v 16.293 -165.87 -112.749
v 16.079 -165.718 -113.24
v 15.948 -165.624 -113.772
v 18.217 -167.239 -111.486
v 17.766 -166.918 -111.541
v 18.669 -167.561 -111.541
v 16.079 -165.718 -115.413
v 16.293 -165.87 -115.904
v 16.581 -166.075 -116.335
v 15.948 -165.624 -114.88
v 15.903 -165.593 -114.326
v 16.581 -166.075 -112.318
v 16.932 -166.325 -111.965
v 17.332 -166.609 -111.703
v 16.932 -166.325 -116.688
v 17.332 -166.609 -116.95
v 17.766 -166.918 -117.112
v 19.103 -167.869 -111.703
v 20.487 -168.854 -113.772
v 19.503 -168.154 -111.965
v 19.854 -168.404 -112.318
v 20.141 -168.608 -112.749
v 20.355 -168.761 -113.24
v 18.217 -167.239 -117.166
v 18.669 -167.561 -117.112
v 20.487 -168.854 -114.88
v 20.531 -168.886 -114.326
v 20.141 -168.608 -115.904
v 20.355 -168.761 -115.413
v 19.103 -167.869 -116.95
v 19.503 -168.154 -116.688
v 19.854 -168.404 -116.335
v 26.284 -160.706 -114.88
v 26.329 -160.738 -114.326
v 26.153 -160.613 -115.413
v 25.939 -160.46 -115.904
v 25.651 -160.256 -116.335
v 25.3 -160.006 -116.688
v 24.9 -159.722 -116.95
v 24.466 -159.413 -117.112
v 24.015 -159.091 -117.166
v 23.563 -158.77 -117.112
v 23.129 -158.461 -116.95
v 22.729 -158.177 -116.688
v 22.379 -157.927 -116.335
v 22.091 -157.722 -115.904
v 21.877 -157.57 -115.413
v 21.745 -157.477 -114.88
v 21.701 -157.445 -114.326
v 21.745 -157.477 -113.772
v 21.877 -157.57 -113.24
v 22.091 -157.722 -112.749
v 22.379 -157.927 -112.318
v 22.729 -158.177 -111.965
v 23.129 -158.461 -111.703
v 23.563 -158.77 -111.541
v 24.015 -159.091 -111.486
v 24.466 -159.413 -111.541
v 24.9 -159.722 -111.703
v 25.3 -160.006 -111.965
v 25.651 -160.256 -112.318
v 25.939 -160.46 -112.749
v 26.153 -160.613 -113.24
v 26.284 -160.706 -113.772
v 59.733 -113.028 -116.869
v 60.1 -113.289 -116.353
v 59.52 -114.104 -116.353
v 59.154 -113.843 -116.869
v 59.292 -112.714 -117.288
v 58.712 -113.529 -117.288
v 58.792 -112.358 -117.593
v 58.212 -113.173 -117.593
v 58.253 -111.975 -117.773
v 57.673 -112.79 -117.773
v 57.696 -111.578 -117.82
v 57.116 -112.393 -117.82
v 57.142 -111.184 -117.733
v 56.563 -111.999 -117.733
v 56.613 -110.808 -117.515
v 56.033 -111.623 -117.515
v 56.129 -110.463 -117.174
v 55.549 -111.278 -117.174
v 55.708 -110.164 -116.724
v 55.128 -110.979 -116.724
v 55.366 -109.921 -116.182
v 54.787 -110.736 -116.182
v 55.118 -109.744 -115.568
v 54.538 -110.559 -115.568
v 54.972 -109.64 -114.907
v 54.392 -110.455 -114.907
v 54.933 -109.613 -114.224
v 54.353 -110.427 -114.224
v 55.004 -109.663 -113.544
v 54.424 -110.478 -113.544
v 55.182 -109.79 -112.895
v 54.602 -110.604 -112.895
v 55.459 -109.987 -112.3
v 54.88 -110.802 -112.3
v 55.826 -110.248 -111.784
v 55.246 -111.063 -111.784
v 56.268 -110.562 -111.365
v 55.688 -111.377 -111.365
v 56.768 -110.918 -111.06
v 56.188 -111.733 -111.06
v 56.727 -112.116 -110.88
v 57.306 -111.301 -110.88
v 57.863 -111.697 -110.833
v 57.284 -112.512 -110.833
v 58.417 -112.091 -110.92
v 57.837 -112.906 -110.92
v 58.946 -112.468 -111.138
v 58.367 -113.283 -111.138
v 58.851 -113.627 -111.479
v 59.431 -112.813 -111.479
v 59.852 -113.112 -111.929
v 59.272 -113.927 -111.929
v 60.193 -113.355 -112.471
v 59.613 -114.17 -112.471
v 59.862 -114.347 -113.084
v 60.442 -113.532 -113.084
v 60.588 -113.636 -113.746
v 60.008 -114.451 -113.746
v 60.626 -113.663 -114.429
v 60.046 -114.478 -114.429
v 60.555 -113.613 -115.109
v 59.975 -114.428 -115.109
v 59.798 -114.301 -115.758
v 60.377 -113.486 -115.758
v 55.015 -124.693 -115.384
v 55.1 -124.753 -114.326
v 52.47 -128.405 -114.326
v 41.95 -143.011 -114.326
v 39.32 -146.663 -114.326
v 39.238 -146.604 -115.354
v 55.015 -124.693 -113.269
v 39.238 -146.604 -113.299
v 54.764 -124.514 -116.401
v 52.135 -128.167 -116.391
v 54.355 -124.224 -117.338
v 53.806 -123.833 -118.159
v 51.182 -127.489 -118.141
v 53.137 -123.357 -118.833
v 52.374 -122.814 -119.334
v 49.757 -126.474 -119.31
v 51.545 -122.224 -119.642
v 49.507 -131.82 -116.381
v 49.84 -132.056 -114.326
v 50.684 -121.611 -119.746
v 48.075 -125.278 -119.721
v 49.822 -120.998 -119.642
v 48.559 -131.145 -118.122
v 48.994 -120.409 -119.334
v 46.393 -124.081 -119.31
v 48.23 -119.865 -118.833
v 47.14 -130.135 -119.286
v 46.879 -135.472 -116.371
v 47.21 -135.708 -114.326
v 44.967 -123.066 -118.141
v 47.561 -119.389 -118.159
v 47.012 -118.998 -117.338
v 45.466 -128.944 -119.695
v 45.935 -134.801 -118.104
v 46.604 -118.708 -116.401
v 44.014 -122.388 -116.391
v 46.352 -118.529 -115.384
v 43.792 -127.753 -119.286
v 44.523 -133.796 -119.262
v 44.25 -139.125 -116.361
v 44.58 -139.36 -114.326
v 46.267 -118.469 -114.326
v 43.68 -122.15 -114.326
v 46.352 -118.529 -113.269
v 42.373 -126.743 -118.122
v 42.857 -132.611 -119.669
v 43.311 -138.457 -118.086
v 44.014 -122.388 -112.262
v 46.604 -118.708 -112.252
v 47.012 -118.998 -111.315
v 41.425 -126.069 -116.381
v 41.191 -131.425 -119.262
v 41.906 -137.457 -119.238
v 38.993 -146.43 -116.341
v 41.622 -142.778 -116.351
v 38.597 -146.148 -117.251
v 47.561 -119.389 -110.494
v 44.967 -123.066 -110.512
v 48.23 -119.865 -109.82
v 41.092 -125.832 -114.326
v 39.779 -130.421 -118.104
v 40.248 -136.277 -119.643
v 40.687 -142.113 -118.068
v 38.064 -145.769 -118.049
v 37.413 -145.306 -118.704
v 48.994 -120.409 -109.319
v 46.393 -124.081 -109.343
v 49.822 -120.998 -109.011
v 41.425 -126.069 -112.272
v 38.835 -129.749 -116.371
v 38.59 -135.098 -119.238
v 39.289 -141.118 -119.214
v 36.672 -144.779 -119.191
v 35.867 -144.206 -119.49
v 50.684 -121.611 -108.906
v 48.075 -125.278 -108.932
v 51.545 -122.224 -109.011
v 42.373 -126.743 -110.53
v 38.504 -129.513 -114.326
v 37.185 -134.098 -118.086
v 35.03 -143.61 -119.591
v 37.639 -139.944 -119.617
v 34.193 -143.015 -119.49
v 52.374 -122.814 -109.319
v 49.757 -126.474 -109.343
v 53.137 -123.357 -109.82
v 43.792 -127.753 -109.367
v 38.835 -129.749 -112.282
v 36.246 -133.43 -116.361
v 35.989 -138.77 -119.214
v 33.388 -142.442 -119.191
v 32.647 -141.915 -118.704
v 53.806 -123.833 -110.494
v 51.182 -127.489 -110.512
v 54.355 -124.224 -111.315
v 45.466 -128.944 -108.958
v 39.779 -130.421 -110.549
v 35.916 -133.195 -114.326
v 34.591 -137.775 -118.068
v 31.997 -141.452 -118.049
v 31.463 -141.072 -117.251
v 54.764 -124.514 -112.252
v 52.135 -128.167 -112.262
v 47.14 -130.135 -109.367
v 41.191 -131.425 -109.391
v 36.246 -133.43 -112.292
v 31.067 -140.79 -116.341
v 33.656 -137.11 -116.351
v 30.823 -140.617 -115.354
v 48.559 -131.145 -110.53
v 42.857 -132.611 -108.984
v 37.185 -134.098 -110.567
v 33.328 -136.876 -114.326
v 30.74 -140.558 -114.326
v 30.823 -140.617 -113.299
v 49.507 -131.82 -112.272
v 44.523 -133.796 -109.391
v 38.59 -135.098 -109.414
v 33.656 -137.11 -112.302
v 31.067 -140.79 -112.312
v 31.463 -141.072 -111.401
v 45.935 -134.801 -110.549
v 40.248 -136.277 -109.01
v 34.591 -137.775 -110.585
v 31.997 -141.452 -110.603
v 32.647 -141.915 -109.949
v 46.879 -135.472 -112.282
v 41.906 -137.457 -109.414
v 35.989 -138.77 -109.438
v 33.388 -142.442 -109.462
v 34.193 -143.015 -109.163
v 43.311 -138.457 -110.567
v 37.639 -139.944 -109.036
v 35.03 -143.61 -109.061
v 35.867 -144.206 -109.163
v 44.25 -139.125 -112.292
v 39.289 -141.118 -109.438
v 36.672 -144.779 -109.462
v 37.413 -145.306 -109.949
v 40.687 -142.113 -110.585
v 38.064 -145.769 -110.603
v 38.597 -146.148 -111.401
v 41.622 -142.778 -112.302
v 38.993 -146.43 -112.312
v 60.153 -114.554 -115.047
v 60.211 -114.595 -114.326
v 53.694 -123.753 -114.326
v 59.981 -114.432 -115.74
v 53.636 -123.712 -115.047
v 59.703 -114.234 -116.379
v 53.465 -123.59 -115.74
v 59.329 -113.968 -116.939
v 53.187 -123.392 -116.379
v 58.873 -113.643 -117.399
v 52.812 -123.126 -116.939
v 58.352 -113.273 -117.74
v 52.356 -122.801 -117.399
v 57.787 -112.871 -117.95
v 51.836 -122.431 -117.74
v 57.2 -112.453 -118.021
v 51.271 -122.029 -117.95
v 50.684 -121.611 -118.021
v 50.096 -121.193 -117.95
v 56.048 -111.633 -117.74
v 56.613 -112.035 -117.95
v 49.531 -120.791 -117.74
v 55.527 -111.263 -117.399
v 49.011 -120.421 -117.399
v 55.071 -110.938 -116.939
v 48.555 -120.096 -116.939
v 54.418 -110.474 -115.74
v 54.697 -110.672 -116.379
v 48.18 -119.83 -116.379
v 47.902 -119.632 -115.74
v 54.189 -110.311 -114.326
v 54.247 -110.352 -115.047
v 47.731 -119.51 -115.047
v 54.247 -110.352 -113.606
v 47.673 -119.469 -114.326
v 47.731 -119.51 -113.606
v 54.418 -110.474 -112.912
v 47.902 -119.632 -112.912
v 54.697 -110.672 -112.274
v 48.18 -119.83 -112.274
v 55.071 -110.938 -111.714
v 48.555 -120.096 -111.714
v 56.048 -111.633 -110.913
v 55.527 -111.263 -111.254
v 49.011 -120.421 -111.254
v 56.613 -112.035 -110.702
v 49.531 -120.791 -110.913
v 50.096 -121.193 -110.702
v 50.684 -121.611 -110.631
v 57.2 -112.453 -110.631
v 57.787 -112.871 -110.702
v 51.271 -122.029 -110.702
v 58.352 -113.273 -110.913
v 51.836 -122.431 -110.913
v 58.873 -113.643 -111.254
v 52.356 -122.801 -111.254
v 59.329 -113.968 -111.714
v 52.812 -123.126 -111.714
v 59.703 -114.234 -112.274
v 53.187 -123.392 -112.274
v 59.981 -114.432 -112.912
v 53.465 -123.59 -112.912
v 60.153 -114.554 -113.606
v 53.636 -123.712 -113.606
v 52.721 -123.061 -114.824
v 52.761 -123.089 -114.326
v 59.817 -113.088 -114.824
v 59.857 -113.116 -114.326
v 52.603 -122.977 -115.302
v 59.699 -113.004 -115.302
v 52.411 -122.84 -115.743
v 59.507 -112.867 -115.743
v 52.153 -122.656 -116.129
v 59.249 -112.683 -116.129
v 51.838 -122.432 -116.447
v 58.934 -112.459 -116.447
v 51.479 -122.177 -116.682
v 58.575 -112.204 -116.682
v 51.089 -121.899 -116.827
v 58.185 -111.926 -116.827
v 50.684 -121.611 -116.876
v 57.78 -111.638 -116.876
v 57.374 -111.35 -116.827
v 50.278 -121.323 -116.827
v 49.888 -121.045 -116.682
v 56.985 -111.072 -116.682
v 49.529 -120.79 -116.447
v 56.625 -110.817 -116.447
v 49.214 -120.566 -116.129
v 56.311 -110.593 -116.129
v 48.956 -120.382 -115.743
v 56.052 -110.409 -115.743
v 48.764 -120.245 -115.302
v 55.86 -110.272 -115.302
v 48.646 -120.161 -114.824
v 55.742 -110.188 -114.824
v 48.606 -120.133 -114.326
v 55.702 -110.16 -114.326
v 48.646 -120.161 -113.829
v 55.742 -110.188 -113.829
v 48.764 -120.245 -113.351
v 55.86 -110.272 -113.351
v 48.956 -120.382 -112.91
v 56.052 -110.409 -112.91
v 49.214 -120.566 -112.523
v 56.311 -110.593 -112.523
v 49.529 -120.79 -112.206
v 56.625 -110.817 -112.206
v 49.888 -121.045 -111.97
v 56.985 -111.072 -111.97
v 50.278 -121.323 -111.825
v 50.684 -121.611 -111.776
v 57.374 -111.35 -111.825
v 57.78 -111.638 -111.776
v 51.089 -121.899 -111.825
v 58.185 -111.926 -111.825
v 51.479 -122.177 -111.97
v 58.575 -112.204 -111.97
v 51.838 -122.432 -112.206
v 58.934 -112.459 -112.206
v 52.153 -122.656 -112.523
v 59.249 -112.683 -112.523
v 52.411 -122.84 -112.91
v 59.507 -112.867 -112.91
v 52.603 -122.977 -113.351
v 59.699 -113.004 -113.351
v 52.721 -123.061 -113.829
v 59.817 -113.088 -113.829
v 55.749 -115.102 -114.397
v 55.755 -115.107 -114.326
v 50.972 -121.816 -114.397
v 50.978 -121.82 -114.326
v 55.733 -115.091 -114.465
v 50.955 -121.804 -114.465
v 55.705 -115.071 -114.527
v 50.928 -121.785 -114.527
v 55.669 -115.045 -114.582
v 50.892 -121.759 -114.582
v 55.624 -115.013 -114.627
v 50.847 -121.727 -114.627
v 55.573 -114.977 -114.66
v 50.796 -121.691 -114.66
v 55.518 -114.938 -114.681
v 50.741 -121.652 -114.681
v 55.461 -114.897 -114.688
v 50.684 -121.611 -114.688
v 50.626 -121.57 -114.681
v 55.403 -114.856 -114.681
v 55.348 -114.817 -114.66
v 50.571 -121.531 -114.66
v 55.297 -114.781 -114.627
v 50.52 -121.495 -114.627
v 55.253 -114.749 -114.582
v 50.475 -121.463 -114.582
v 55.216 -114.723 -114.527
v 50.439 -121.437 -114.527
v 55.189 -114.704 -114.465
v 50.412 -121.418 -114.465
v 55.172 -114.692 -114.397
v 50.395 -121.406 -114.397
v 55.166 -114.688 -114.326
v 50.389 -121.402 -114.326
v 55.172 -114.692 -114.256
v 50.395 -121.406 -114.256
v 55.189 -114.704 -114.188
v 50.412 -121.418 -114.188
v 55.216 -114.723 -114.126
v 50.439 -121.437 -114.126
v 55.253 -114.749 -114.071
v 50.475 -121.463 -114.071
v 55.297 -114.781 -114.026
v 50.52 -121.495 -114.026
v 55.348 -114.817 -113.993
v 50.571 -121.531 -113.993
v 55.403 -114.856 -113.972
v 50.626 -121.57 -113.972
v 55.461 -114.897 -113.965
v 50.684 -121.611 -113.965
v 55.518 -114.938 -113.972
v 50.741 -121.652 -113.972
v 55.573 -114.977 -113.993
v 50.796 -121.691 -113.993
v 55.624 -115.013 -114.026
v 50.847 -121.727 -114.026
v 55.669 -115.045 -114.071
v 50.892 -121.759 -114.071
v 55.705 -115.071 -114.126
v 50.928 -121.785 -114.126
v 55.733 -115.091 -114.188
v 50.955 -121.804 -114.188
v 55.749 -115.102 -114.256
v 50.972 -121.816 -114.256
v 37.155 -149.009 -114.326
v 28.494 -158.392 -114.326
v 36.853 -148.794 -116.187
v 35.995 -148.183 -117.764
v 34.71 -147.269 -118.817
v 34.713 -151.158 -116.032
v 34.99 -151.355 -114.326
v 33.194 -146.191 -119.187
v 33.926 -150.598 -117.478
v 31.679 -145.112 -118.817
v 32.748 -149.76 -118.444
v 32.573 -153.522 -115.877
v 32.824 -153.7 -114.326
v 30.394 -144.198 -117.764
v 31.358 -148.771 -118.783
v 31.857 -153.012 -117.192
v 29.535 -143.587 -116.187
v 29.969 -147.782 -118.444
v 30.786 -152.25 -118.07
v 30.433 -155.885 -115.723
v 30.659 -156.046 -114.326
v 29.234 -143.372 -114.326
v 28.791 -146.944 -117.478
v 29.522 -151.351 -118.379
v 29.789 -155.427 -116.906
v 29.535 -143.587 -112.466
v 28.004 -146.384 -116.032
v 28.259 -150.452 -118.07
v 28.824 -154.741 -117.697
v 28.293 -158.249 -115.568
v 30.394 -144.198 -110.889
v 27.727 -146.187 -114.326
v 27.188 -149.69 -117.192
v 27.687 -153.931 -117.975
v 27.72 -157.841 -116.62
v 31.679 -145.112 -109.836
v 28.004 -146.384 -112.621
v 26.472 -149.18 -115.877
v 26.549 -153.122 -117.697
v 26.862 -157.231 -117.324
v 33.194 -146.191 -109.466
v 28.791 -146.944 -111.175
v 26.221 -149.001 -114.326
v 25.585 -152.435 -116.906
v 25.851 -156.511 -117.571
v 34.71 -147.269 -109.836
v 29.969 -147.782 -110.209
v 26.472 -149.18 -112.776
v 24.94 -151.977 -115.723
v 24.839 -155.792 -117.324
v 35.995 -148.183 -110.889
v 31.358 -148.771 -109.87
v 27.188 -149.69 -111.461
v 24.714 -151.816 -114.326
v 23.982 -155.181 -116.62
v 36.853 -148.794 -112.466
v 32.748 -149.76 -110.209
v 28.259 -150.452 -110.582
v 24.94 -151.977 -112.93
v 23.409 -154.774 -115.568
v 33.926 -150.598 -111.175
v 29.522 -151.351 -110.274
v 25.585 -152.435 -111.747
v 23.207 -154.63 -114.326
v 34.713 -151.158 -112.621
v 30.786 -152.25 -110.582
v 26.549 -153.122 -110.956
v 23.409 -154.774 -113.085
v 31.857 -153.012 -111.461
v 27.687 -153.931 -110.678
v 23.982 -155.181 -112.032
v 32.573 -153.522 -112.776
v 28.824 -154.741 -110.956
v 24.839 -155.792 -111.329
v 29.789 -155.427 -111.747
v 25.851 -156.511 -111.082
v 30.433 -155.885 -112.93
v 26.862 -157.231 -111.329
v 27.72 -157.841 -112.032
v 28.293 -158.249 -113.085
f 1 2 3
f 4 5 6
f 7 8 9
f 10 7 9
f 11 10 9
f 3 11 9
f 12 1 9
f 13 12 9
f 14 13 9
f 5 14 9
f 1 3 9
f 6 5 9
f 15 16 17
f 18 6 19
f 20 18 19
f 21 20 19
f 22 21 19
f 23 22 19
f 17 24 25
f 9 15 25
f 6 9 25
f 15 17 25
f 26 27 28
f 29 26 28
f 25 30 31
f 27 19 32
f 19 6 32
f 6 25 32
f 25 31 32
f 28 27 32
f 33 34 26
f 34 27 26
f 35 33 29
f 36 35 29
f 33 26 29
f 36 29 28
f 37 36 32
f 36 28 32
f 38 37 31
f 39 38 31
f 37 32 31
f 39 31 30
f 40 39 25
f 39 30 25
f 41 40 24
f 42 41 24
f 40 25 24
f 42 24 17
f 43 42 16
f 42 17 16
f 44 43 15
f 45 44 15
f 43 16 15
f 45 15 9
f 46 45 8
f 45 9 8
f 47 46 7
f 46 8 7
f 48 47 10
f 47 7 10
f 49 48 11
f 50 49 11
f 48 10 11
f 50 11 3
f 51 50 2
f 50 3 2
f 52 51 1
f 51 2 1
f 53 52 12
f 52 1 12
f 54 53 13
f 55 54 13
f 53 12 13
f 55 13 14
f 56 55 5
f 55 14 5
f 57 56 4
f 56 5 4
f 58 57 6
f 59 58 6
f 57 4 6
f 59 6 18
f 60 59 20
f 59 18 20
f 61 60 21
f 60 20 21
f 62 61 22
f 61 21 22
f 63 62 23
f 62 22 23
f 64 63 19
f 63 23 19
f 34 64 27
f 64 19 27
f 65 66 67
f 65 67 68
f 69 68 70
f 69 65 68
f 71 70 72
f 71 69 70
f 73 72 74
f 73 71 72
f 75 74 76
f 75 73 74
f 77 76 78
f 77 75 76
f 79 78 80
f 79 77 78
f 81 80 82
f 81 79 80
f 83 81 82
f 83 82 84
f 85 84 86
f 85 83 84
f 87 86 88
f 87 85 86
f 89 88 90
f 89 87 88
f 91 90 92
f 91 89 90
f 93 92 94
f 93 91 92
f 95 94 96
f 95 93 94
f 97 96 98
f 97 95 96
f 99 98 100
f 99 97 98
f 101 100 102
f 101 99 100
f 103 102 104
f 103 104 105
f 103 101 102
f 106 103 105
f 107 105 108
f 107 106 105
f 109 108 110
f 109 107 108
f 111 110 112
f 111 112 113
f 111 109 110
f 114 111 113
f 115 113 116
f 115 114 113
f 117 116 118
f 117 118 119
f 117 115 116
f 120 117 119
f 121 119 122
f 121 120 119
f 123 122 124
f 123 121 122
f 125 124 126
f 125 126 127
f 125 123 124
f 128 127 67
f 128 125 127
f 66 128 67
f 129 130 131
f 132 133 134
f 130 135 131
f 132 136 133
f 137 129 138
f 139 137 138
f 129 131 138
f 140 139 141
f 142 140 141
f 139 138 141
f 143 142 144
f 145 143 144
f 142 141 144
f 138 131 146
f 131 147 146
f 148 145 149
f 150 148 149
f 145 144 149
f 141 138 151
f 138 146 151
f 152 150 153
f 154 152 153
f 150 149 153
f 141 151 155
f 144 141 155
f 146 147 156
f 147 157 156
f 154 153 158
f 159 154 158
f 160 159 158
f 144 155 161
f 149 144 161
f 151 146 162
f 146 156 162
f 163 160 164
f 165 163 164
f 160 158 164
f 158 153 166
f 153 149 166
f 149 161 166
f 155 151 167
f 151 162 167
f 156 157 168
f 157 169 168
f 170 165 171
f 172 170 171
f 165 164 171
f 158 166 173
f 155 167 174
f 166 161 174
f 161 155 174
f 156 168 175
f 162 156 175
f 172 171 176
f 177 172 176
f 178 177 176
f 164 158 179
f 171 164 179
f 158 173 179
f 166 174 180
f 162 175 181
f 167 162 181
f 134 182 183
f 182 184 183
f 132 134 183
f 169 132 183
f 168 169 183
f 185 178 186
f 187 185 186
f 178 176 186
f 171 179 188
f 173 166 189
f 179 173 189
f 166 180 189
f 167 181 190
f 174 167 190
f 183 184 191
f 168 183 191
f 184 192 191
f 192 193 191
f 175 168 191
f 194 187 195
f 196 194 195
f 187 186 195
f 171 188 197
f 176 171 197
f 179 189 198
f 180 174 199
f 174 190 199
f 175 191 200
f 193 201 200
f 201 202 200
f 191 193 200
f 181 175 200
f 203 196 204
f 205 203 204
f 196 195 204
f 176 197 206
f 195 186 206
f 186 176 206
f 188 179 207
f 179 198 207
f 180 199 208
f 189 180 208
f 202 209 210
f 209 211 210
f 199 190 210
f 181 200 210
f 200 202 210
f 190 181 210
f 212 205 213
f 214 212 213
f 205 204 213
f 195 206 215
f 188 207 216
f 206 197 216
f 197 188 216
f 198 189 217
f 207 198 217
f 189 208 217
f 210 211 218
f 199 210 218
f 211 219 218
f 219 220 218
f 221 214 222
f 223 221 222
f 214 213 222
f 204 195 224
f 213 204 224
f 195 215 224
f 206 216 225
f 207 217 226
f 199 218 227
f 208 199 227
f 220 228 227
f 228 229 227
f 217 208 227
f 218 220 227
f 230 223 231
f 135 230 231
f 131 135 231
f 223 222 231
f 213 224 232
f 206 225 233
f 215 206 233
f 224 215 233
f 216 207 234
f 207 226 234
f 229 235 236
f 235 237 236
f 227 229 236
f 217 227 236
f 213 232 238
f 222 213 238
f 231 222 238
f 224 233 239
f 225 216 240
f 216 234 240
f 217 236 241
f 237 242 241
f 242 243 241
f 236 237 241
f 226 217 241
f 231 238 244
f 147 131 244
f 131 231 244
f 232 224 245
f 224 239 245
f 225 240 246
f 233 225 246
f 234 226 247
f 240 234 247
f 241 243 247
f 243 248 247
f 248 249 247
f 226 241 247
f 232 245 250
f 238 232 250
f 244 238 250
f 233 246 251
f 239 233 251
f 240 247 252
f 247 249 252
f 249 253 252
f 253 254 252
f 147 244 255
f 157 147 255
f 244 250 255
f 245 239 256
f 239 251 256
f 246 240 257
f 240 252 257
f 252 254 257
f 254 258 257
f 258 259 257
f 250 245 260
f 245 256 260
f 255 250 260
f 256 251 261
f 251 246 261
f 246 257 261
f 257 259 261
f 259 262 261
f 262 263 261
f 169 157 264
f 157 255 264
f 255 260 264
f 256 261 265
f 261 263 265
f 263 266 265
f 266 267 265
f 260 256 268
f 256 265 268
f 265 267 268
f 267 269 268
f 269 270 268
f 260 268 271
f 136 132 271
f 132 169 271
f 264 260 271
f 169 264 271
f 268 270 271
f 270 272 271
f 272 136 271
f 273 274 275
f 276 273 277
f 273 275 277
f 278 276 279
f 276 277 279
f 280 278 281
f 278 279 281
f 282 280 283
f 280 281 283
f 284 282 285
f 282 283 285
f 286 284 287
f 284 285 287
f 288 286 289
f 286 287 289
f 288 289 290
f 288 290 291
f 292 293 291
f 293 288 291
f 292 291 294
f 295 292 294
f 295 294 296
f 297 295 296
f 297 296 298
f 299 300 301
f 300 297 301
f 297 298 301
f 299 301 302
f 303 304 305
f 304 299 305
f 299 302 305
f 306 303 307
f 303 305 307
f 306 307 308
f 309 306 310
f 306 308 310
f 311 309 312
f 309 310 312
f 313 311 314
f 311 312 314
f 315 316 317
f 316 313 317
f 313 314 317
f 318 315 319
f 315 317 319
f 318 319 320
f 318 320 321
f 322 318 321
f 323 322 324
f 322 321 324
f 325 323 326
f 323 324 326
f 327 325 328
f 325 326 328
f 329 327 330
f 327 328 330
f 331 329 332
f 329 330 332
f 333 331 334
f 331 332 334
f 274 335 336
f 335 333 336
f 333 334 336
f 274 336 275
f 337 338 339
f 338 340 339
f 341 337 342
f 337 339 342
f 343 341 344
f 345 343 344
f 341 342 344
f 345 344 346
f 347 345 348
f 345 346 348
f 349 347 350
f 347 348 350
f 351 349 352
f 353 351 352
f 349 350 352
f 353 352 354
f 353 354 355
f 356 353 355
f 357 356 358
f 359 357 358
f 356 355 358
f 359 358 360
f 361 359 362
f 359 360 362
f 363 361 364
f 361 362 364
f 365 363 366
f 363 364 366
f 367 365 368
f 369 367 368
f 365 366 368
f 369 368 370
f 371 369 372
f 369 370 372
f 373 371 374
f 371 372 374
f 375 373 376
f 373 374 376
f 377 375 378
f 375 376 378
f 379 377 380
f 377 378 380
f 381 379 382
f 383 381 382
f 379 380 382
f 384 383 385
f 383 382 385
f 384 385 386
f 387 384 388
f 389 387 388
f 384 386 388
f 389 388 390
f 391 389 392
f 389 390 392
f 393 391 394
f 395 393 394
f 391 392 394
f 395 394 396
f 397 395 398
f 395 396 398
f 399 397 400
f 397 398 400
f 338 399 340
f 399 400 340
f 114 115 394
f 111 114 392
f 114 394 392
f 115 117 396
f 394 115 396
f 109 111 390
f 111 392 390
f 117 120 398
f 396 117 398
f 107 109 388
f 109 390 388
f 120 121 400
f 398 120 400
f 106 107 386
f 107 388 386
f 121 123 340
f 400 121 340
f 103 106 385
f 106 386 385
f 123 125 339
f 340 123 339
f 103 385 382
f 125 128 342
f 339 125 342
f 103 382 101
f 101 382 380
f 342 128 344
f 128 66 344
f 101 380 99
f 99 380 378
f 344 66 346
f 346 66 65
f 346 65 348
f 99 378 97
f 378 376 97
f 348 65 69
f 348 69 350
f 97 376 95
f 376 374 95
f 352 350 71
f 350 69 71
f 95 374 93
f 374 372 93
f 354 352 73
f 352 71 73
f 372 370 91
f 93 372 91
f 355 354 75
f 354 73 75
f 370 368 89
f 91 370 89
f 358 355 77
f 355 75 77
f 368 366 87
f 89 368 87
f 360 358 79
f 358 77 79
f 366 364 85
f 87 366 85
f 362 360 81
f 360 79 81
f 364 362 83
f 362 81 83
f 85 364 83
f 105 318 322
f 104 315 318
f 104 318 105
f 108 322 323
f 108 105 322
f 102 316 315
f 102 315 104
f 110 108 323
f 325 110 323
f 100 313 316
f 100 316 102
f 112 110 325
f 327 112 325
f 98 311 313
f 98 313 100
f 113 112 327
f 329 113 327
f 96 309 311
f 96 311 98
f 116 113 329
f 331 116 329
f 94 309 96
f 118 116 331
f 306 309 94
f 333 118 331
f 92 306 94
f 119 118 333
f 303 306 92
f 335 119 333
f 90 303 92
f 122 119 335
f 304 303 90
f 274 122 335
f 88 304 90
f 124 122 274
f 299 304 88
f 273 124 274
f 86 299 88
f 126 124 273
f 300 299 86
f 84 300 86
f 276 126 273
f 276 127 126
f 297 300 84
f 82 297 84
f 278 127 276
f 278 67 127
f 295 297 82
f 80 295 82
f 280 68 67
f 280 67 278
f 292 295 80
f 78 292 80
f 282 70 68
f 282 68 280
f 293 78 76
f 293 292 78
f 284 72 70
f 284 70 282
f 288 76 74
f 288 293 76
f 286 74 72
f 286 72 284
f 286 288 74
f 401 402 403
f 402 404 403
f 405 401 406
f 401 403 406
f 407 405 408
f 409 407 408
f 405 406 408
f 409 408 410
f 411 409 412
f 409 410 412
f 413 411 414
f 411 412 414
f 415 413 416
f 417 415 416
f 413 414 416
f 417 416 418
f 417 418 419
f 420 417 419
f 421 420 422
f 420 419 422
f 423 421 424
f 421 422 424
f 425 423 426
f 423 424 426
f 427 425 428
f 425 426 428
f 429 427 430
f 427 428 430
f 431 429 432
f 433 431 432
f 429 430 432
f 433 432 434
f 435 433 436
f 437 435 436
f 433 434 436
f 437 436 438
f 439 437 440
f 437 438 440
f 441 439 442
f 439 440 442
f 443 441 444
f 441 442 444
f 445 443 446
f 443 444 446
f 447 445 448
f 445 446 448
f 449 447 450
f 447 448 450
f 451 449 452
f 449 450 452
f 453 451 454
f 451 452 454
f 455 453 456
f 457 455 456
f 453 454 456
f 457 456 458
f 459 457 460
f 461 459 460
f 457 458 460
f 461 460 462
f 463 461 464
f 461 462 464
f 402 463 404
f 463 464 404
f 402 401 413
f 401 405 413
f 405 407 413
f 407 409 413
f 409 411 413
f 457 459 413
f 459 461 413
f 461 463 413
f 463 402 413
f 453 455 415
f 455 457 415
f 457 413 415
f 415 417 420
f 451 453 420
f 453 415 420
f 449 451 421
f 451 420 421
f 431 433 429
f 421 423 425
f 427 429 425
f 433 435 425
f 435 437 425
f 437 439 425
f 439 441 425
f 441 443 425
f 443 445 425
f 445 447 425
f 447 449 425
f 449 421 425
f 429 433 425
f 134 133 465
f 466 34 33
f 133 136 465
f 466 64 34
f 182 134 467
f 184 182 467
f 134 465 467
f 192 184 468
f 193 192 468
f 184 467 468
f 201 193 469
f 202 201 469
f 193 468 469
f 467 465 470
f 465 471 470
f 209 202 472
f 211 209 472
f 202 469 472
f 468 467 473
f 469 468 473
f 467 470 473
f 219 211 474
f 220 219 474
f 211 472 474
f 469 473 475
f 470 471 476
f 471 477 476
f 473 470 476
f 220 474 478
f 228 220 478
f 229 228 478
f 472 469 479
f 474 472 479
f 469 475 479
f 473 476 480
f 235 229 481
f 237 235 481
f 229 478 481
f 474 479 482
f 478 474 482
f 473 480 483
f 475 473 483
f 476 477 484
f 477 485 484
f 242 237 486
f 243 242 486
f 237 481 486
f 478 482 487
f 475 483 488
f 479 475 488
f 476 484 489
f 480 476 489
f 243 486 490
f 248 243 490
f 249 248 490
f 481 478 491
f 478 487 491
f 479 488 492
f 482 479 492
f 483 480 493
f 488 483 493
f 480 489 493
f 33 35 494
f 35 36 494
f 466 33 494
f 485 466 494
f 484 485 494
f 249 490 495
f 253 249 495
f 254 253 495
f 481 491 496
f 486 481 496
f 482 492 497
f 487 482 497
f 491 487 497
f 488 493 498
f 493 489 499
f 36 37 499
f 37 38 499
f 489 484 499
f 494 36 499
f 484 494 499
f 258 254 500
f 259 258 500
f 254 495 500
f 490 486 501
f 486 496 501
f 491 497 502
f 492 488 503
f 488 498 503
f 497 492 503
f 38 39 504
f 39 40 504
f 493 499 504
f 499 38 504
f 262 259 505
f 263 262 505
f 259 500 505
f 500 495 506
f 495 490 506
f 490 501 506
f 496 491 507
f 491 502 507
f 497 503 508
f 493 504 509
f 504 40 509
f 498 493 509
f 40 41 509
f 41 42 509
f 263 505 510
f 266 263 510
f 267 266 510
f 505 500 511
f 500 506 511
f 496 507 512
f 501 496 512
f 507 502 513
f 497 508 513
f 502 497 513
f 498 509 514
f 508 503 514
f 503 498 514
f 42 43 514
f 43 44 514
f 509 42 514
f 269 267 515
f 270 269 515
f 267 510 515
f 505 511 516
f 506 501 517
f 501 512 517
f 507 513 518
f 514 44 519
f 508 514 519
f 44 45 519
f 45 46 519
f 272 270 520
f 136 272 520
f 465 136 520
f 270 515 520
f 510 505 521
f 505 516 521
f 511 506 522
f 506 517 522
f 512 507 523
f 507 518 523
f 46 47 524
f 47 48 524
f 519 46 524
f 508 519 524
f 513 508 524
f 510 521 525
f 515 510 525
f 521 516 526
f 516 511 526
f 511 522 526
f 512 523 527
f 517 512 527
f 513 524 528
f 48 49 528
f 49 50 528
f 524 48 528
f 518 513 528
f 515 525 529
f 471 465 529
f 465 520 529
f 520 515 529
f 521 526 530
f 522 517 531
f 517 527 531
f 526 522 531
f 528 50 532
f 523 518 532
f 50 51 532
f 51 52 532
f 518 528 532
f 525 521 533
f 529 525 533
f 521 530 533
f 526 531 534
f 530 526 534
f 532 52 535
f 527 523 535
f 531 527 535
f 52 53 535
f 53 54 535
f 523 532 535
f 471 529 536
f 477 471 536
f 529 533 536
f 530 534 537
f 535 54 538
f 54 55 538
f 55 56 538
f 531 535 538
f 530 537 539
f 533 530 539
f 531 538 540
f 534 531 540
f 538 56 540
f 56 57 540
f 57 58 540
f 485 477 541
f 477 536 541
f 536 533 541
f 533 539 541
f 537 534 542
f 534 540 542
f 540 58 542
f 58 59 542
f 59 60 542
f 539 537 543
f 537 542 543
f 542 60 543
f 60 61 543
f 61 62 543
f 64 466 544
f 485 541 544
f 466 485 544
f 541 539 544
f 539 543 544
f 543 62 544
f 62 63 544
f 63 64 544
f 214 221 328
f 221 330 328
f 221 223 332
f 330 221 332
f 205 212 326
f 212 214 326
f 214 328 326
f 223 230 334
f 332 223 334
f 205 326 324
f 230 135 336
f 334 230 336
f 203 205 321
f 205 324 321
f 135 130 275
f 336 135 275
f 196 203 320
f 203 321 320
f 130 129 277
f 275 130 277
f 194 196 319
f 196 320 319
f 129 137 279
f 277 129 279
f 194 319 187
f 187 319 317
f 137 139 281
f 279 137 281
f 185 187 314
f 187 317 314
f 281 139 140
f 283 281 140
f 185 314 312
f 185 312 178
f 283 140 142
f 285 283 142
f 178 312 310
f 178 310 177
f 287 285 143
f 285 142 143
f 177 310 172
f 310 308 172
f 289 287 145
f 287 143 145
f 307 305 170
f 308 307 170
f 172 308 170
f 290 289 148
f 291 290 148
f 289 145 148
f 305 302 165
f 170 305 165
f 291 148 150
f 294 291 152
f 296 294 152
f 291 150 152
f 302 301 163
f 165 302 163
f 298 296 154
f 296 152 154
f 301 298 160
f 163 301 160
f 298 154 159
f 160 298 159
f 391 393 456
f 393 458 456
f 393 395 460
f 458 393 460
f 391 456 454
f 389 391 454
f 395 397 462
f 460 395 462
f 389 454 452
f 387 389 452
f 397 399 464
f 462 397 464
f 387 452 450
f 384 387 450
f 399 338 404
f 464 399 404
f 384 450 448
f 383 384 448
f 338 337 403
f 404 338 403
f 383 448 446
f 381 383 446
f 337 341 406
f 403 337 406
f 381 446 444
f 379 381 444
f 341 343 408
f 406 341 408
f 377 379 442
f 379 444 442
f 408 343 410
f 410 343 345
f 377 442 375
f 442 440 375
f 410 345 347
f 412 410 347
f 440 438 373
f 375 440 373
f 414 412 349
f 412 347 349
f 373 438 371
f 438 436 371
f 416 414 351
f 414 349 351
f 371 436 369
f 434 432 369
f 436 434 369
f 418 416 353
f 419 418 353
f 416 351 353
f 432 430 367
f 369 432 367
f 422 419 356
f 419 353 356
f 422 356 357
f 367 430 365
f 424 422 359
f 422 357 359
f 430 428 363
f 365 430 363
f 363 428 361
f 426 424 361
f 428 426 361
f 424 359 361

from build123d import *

# Parameters (mm, degrees)
SKETCH2_OUTSIDE_W  = 81.185
SKETCH2_OUTSIDE_H  = 67.044
SKETCH2_OUTSIDE_R  = 3.495
CUT_EXTRUDE1_DEPTH = 1


with BuildPart() as part:
    # Sketch1 → Revolve1 (revolve)
    with BuildSketch(Plane(origin=(96.031948768, 24.259878967, -114.32637478), x_dir=(0.579754018, 0.814791555, 0), z_dir=(0, 0, -1))):
        Polygon((-201.145317806, 47.619722085), (-136.905317806, 47.619722085), (-136.905317806, 47.980853052), (-145.145317806, 47.980853052), (-145.145317806, 50.169722085), (-132.905317806, 50.169722085), (-132.905317806, 51.314722085), (-145.145317806, 51.314722085), (-145.145317806, 53.039722085), (-172.145317806, 52.884722085), (-191.145317806, 50.459722085), (-201.145317806, 50.459722085), align=None)
    revolve(axis=Axis((18.217289915, -167.239352557, -114.32637478), (0.579754018, 0.814791555, 0)))

    # Sketch2 outside → Cut-Extrude1 (cut)
    with BuildSketch(Plane(origin=(-33.314790755, -46.820909057, 0), x_dir=(0.663885278, -0.472378678, -0.579754018), z_dir=(0.579754018, 0.814791555, 0))):
        with Locations((157.4895, 28.254)):
            Rectangle(SKETCH2_OUTSIDE_W, SKETCH2_OUTSIDE_H)
        with Locations((157.375670059, 28.335096914)):
            Circle(SKETCH2_OUTSIDE_R, mode=Mode.SUBTRACT)
    extrude(amount=-CUT_EXTRUDE1_DEPTH, mode=Mode.SUBTRACT)


solid = part.part
